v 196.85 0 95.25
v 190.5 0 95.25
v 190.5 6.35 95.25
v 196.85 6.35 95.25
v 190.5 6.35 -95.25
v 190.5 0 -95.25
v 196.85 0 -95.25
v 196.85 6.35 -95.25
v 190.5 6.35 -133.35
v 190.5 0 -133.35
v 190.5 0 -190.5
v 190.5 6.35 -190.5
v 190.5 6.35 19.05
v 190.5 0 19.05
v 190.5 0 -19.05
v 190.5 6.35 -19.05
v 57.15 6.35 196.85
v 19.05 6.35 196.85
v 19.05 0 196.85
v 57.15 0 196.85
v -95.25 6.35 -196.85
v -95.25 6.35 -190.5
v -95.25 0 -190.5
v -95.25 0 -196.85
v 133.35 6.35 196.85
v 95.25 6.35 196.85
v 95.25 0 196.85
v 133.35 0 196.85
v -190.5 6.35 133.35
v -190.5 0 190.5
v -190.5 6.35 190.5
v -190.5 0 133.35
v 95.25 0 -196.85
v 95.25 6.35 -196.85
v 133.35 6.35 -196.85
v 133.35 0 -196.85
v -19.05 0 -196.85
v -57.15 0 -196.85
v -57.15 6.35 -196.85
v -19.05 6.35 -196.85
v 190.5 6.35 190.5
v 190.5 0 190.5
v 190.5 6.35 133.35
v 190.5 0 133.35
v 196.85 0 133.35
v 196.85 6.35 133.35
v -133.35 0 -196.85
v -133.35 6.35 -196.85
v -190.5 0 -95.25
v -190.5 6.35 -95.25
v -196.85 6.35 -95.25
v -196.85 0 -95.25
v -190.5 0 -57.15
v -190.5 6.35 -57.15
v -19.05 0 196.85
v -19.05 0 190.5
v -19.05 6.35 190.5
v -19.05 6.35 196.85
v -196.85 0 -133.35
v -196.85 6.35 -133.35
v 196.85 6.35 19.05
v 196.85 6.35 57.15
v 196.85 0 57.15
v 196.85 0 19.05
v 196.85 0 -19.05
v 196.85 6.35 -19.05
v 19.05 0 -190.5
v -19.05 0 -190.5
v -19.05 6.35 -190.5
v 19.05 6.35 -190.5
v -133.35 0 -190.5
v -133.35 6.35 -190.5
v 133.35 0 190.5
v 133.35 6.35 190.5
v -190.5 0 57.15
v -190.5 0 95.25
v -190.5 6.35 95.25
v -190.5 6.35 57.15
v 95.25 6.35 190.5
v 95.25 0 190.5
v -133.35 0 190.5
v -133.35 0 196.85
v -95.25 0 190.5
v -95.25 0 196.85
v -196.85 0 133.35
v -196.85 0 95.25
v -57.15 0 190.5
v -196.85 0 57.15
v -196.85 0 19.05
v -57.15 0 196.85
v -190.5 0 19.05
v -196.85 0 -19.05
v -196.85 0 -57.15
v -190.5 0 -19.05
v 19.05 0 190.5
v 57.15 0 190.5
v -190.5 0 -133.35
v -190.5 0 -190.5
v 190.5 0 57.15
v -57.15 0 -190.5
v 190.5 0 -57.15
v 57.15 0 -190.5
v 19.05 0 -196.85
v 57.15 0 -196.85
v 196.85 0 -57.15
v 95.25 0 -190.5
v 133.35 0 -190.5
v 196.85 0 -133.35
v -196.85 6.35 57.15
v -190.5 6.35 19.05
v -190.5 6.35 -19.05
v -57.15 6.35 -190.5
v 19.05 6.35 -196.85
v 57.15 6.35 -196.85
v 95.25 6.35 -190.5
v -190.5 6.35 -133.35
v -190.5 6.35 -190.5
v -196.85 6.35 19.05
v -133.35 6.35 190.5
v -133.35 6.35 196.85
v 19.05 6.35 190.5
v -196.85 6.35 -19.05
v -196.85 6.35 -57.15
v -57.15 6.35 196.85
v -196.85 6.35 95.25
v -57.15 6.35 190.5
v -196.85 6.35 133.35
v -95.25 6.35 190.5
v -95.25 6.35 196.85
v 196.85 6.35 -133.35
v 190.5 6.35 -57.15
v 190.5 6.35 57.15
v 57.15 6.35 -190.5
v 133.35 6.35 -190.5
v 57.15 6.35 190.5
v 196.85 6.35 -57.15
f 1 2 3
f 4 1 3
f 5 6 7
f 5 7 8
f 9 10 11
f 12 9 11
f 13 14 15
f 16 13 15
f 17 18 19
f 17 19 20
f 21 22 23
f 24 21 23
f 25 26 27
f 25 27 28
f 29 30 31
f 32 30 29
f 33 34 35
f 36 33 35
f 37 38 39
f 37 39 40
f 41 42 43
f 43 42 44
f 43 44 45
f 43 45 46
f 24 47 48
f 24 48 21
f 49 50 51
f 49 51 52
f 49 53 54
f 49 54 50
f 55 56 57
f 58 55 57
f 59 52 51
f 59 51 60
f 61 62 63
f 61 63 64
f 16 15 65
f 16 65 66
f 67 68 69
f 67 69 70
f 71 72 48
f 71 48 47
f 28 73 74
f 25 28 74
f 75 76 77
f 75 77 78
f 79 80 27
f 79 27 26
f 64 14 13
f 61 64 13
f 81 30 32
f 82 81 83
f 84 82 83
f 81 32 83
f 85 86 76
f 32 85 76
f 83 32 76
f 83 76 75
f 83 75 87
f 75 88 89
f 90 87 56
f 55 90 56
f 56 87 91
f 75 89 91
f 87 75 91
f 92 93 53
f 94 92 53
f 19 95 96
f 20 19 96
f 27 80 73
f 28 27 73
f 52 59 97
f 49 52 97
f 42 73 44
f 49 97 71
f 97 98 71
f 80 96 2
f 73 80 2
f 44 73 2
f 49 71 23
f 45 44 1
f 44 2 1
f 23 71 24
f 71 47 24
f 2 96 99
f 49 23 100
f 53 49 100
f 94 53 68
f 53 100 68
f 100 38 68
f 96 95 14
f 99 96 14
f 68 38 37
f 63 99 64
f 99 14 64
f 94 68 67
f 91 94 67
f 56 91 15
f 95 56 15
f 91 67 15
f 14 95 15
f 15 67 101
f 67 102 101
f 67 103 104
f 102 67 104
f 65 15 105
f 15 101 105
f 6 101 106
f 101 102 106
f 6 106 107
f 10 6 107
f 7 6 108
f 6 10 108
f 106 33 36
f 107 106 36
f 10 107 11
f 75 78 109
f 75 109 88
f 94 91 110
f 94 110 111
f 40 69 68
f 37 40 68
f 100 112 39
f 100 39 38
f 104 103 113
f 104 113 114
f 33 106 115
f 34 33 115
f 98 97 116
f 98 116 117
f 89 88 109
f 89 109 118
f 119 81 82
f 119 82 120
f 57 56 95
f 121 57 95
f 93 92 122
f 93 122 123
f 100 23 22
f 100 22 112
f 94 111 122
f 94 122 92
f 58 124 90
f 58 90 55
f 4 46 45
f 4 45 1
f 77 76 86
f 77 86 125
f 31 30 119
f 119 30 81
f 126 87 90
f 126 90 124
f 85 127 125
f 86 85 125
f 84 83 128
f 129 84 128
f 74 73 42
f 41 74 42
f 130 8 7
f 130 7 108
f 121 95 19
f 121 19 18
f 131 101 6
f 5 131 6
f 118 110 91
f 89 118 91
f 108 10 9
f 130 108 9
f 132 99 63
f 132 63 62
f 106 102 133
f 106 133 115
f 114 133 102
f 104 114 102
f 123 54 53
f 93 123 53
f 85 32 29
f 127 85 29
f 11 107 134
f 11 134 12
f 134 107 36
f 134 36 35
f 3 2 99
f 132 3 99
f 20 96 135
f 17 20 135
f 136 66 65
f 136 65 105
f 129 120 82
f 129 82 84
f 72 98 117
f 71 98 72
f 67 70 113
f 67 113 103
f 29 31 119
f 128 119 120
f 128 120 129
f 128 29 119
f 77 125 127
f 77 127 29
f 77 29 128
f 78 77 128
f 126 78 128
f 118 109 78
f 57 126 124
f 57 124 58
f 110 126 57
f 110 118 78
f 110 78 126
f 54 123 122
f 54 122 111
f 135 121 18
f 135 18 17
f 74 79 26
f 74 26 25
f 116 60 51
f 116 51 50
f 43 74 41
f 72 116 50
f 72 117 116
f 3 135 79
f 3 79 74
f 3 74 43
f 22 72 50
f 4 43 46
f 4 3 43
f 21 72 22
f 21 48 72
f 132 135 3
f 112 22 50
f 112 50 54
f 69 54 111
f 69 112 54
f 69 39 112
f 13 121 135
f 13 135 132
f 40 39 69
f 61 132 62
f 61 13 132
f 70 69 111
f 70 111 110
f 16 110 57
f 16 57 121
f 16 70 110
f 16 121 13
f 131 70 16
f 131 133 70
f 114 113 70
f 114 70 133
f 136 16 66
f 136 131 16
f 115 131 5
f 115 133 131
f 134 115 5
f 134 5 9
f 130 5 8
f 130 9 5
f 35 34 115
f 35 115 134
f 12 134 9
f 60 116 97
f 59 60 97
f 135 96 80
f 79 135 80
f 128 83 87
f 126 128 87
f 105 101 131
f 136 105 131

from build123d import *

# Parameters (mm, degrees)
ESQUISSE1_W                = 381
ESQUISSE1_H                = 381
BOSS_EXTRU_1_DEPTH         = 6.35
ESQUISSE2_W                = 38.1
ESQUISSE2_H                = 6.35
BOSS_EXTRU_2_DEPTH         = 6.35
R_P_TITION_LIN_AIRE1_COUNT = 4
R_P_TITION_LIN_AIRE1_PITCH = 76.2
SYM_TRIE1_COPY_1_SKETCH_W  = 38.1
SYM_TRIE1_COPY_1_SKETCH_H  = 6.35
SYM_TRIE1_COPY_1_DEPTH     = 6.35
SYM_TRIE1_COPY_2_SKETCH_W  = 38.1
SYM_TRIE1_COPY_2_SKETCH_H  = 6.35
SYM_TRIE1_COPY_2_DEPTH     = 6.35
SYM_TRIE1_COPY_3_SKETCH_W  = 38.1
SYM_TRIE1_COPY_3_SKETCH_H  = 6.35
SYM_TRIE1_COPY_3_DEPTH     = 6.35
ESQUISSE3_W                = 38.1
ESQUISSE3_H                = 6.35
BOSS_EXTRU_3_DEPTH         = 6.35
R_P_TITION_LIN_AIRE2_COUNT = 4
R_P_TITION_LIN_AIRE2_PITCH = 76.2
SYM_TRIE2_COPY_1_SKETCH_W  = 38.1
SYM_TRIE2_COPY_1_SKETCH_H  = 6.35
SYM_TRIE2_COPY_1_DEPTH     = 6.35
SYM_TRIE2_COPY_2_SKETCH_W  = 38.1
SYM_TRIE2_COPY_2_SKETCH_H  = 6.35
SYM_TRIE2_COPY_2_DEPTH     = 6.35
SYM_TRIE2_COPY_3_SKETCH_W  = 38.1
SYM_TRIE2_COPY_3_SKETCH_H  = 6.35
SYM_TRIE2_COPY_3_DEPTH     = 6.35


with BuildPart() as part:
    # Esquisse1 → Boss.-Extru.1 (new body)
    with BuildSketch(Plane(origin=(0, 0, 0), x_dir=(1, 0, 0), z_dir=(0, 1, 0))):
        Rectangle(ESQUISSE1_W, ESQUISSE1_H)
    extrude(amount=BOSS_EXTRU_1_DEPTH)

    # Esquisse2 → Boss.-Extru.2 (add)
    with BuildSketch(Plane(origin=(190.5, 0, 0), x_dir=(0, 0, -1), z_dir=(1, 0, 0))):
        with Locations((-114.3, 3.175)):
            Rectangle(ESQUISSE2_W, ESQUISSE2_H)
    boss_extru_2 = extrude(amount=BOSS_EXTRU_2_DEPTH)

    # Répétition linéaire1: Boss.-Extru.2 ×4
    with Locations(*[(0, 0, -i * R_P_TITION_LIN_AIRE1_PITCH) for i in range(1, R_P_TITION_LIN_AIRE1_COUNT)]):
        add(boss_extru_2)

    # Symétrie1: Boss.-Extru.2 across plane
    add(boss_extru_2.mirror(Plane(origin=(0, 0, 0), x_dir=(0, 0, 1), z_dir=(1, 0, 0))))

    # Symétrie1 copy 1 sketch → Symétrie1 copy 1 (add)
    with BuildSketch(Plane(origin=(-190.5, 0, -76.2), x_dir=(0, 0, -1), z_dir=(-1, 0, 0))):
        with Locations((-114.3, -3.175)):
            Rectangle(SYM_TRIE1_COPY_1_SKETCH_W, SYM_TRIE1_COPY_1_SKETCH_H)
    extrude(amount=SYM_TRIE1_COPY_1_DEPTH)

    # Symétrie1 copy 2 sketch → Symétrie1 copy 2 (add)
    with BuildSketch(Plane(origin=(-190.5, 0, -152.4), x_dir=(0, 0, -1), z_dir=(-1, 0, 0))):
        with Locations((-114.3, -3.175)):
            Rectangle(SYM_TRIE1_COPY_2_SKETCH_W, SYM_TRIE1_COPY_2_SKETCH_H)
    extrude(amount=SYM_TRIE1_COPY_2_DEPTH)

    # Symétrie1 copy 3 sketch → Symétrie1 copy 3 (add)
    with BuildSketch(Plane(origin=(-190.5, 0, -228.6), x_dir=(0, 0, -1), z_dir=(-1, 0, 0))):
        with Locations((-114.3, -3.175)):
            Rectangle(SYM_TRIE1_COPY_3_SKETCH_W, SYM_TRIE1_COPY_3_SKETCH_H)
    extrude(amount=SYM_TRIE1_COPY_3_DEPTH)

    # Esquisse3 → Boss.-Extru.3 (add)
    with BuildSketch(Plane.XY.offset(190.5)):
        with Locations((114.3, 3.175)):
            Rectangle(ESQUISSE3_W, ESQUISSE3_H)
    boss_extru_3 = extrude(amount=BOSS_EXTRU_3_DEPTH)

    # Répétition linéaire2: Boss.-Extru.3 ×4
    with Locations(*[(-i * R_P_TITION_LIN_AIRE2_PITCH, 0, 0) for i in range(1, R_P_TITION_LIN_AIRE2_COUNT)]):
        add(boss_extru_3)

    # Symétrie2: Boss.-Extru.3 across plane
    add(boss_extru_3.mirror(Plane.XY))

    # Symétrie2 copy 1 sketch → Symétrie2 copy 1 (add)
    with BuildSketch(Plane(origin=(-76.2, 0, -190.5), x_dir=(1, 0, 0), z_dir=(0, 0, -1))):
        with Locations((114.3, -3.175)):
            Rectangle(SYM_TRIE2_COPY_1_SKETCH_W, SYM_TRIE2_COPY_1_SKETCH_H)
    extrude(amount=SYM_TRIE2_COPY_1_DEPTH)

    # Symétrie2 copy 2 sketch → Symétrie2 copy 2 (add)
    with BuildSketch(Plane(origin=(-152.4, 0, -190.5), x_dir=(1, 0, 0), z_dir=(0, 0, -1))):
        with Locations((114.3, -3.175)):
            Rectangle(SYM_TRIE2_COPY_2_SKETCH_W, SYM_TRIE2_COPY_2_SKETCH_H)
    extrude(amount=SYM_TRIE2_COPY_2_DEPTH)

    # Symétrie2 copy 3 sketch → Symétrie2 copy 3 (add)
    with BuildSketch(Plane(origin=(-228.6, 0, -190.5), x_dir=(1, 0, 0), z_dir=(0, 0, -1))):
        with Locations((114.3, -3.175)):
            Rectangle(SYM_TRIE2_COPY_3_SKETCH_W, SYM_TRIE2_COPY_3_SKETCH_H)
    extrude(amount=SYM_TRIE2_COPY_3_DEPTH)


solid = part.part
